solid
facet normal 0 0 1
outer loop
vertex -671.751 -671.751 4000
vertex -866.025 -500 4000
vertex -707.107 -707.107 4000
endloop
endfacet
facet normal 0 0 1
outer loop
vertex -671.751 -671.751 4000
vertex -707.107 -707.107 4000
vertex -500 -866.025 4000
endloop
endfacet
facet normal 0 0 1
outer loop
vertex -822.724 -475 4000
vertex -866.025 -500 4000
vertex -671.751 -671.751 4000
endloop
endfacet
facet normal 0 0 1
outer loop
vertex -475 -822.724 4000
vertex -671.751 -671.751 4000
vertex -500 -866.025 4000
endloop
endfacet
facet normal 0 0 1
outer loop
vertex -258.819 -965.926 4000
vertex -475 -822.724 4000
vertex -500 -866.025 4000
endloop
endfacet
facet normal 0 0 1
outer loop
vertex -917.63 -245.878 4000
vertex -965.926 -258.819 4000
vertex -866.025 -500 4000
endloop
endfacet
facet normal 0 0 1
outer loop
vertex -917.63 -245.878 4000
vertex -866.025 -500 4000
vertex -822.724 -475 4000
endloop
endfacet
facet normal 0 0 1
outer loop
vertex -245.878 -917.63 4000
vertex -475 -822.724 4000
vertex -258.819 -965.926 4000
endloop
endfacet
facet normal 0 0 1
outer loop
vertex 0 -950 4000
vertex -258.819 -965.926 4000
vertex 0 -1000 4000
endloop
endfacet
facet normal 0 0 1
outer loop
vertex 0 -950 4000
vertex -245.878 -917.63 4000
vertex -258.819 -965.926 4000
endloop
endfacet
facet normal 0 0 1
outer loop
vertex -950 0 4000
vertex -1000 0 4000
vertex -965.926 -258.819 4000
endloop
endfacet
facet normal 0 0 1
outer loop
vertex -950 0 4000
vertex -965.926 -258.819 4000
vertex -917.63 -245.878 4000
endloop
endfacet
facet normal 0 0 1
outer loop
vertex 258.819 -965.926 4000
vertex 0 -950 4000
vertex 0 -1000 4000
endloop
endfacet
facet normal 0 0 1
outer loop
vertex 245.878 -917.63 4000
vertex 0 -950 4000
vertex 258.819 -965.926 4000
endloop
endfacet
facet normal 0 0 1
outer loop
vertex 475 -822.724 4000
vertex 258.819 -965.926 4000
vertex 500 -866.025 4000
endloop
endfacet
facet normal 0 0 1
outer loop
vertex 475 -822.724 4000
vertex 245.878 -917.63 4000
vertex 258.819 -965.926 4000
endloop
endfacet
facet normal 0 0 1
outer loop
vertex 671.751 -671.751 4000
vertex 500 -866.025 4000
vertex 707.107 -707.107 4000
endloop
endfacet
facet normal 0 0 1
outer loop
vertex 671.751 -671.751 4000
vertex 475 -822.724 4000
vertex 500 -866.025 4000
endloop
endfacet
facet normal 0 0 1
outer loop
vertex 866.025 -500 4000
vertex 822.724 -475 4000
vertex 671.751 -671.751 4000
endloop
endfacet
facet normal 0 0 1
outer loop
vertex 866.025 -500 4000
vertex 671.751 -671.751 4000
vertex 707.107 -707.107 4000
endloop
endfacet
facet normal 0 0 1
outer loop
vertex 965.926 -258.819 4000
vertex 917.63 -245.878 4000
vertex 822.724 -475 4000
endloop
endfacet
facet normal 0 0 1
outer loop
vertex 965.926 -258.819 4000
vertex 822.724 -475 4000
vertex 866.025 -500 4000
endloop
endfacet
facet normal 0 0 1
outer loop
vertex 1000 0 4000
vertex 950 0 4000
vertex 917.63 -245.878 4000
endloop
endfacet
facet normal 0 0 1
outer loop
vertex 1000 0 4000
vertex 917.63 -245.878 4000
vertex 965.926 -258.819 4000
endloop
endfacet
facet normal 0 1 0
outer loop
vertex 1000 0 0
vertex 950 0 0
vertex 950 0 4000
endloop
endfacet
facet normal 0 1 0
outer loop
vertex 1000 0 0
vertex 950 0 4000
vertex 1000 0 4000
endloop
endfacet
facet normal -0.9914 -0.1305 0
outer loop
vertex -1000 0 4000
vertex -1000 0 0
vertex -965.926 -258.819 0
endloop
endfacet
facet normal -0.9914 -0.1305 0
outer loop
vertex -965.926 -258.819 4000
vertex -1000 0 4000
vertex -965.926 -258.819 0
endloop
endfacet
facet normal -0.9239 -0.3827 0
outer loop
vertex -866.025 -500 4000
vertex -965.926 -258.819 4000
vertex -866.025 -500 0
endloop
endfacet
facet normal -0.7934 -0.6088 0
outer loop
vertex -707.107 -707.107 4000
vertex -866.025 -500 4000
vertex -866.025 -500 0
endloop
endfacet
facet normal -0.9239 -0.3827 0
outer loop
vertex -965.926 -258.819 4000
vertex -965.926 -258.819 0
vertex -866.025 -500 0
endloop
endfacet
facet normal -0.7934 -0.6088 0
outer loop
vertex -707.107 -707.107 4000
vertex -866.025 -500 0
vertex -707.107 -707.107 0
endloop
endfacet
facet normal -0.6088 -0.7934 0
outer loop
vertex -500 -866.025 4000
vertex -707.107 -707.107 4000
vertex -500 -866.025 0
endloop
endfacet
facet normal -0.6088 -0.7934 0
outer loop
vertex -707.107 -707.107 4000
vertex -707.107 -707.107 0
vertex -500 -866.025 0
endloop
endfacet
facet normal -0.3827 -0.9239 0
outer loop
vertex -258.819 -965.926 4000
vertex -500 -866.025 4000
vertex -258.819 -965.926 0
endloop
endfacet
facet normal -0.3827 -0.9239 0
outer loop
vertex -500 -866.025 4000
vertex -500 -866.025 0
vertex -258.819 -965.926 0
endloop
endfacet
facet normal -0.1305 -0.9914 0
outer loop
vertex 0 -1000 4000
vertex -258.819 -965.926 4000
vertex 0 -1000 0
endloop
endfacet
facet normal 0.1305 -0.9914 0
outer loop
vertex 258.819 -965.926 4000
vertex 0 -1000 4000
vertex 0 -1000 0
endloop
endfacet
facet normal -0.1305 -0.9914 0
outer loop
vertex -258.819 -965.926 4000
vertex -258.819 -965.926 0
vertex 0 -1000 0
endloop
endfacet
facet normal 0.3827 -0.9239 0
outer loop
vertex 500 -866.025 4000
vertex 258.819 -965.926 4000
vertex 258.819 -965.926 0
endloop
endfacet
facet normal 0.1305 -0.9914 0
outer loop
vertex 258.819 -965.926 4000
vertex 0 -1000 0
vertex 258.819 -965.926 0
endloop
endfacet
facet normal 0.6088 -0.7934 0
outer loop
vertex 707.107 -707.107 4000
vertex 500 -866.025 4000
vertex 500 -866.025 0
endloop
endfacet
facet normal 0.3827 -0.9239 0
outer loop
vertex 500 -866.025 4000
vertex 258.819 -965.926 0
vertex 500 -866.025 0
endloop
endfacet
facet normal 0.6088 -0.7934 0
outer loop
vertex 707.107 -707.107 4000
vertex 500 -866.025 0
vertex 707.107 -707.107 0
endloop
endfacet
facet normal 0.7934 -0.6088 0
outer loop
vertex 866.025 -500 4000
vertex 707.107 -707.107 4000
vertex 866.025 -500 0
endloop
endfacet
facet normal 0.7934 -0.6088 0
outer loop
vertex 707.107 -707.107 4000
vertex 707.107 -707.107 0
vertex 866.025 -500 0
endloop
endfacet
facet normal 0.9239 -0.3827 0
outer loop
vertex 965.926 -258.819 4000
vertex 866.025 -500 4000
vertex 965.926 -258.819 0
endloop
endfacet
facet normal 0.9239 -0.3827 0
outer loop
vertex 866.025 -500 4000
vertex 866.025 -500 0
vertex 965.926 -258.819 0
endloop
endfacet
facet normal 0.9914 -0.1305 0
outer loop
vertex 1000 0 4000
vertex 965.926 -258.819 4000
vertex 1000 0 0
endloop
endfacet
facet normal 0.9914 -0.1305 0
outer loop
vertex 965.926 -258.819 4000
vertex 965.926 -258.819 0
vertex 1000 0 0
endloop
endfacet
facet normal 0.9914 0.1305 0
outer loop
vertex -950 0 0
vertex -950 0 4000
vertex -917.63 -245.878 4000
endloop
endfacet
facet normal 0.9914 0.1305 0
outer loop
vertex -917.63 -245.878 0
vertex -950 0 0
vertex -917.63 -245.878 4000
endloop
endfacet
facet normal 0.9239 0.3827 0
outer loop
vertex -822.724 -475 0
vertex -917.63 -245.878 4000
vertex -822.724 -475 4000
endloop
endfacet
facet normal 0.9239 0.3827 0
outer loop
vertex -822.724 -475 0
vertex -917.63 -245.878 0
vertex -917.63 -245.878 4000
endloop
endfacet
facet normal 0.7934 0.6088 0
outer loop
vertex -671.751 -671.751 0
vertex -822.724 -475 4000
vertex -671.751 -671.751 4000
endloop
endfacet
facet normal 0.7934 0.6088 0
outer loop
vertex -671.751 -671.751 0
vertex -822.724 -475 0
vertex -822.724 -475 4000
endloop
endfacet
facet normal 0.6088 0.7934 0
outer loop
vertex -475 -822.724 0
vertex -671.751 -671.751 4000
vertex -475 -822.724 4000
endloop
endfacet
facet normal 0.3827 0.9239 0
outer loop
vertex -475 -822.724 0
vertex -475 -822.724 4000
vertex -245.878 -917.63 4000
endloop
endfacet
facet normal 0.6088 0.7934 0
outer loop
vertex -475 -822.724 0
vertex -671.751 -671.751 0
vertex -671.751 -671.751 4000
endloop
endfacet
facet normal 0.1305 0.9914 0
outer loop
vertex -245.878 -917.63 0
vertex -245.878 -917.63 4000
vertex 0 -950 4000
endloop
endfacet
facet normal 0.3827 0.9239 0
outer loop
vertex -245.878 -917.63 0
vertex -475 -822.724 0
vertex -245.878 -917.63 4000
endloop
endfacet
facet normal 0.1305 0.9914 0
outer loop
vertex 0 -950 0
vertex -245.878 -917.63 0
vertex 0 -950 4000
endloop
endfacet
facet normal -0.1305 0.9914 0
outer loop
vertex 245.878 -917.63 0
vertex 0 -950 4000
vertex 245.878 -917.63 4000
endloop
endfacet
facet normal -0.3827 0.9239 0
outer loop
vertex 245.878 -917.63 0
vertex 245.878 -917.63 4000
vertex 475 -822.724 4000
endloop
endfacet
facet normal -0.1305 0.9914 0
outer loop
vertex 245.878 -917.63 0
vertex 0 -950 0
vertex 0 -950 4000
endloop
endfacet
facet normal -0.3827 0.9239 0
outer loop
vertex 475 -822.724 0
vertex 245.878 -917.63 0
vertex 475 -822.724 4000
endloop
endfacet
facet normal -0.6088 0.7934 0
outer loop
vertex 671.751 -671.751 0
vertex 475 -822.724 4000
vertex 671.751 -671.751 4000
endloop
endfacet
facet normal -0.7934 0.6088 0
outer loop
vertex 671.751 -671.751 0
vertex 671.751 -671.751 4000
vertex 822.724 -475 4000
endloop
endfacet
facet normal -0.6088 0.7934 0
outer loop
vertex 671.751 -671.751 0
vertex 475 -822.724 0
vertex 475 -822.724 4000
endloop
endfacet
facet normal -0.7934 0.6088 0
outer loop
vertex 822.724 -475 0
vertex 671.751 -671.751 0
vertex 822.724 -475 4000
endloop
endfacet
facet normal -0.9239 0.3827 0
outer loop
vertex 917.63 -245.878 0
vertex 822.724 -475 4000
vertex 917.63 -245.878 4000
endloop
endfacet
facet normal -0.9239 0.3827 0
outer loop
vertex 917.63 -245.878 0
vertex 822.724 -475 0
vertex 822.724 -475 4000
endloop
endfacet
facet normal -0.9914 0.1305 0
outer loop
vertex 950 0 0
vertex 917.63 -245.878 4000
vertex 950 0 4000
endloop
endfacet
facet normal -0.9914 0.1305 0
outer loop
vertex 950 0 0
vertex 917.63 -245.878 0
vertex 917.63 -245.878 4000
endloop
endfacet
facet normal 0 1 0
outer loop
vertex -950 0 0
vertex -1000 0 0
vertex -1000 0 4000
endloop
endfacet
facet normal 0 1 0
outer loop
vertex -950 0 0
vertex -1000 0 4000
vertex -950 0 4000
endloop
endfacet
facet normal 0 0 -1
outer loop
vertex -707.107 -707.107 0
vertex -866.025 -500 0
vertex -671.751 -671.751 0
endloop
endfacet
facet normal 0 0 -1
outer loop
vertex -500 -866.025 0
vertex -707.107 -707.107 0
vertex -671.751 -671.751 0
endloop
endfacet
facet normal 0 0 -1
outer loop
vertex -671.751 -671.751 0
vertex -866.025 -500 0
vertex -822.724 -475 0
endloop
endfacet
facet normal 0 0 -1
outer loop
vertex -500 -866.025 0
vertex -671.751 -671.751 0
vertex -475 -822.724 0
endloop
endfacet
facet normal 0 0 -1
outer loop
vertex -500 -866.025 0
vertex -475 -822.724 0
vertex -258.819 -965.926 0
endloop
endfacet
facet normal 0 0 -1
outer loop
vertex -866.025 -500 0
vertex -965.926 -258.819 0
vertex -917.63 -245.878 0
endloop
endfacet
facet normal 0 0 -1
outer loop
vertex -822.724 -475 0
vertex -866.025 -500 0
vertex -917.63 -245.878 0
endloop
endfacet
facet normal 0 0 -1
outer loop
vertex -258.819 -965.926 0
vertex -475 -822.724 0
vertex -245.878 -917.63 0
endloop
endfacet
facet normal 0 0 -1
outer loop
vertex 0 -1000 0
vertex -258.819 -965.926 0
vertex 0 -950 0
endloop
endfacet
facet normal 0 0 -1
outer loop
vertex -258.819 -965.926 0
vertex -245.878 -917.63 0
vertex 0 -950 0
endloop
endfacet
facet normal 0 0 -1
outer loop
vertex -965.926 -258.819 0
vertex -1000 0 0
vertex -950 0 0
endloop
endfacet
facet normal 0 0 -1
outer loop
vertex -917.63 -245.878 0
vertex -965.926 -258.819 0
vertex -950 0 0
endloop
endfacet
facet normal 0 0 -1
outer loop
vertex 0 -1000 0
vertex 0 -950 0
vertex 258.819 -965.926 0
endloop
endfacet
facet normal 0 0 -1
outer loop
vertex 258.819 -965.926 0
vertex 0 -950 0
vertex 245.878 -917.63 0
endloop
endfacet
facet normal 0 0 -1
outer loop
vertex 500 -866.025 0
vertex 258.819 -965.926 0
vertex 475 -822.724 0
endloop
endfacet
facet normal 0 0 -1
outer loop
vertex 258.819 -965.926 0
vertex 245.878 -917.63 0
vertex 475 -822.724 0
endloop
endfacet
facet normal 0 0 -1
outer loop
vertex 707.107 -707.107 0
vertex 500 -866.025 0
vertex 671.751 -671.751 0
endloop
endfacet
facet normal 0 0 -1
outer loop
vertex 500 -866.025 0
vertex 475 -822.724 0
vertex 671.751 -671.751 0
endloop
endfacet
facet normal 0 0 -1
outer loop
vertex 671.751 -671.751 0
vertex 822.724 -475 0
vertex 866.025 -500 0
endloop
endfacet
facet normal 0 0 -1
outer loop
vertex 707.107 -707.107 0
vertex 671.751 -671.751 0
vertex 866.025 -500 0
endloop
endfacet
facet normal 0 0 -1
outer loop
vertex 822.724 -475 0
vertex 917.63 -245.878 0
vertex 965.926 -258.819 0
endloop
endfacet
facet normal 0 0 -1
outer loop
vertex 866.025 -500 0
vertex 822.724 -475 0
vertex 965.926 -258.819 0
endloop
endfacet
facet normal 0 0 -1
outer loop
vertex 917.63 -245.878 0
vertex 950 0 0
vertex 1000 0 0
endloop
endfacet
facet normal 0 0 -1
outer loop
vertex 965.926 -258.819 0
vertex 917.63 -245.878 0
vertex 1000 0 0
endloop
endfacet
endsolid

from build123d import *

# Parameters (mm, degrees)
SKETCH001_W  = 5000
SKETCH001_H  = 2000
PAD001_DEPTH = 20000
SKETCH_R     = 1000
SKETCH_R_2   = 950
PAD_DEPTH    = 4000


with BuildPart() as pad001:
    # Sketch001 → Pad001 (new body)
    with BuildSketch(Plane.XY):
        with Locations((0, 1000)):
            Rectangle(SKETCH001_W, SKETCH001_H)
    extrude(amount=PAD001_DEPTH)


with BuildPart() as cut:
    # Sketch → Pad (new body)
    with BuildSketch(Plane.XY):
        Circle(SKETCH_R)
        Circle(SKETCH_R_2, mode=Mode.SUBTRACT)
    extrude(amount=PAD_DEPTH)

    # Cut: cut Pad001
    add(pad001.part, mode=Mode.SUBTRACT)


solid = cut.part
